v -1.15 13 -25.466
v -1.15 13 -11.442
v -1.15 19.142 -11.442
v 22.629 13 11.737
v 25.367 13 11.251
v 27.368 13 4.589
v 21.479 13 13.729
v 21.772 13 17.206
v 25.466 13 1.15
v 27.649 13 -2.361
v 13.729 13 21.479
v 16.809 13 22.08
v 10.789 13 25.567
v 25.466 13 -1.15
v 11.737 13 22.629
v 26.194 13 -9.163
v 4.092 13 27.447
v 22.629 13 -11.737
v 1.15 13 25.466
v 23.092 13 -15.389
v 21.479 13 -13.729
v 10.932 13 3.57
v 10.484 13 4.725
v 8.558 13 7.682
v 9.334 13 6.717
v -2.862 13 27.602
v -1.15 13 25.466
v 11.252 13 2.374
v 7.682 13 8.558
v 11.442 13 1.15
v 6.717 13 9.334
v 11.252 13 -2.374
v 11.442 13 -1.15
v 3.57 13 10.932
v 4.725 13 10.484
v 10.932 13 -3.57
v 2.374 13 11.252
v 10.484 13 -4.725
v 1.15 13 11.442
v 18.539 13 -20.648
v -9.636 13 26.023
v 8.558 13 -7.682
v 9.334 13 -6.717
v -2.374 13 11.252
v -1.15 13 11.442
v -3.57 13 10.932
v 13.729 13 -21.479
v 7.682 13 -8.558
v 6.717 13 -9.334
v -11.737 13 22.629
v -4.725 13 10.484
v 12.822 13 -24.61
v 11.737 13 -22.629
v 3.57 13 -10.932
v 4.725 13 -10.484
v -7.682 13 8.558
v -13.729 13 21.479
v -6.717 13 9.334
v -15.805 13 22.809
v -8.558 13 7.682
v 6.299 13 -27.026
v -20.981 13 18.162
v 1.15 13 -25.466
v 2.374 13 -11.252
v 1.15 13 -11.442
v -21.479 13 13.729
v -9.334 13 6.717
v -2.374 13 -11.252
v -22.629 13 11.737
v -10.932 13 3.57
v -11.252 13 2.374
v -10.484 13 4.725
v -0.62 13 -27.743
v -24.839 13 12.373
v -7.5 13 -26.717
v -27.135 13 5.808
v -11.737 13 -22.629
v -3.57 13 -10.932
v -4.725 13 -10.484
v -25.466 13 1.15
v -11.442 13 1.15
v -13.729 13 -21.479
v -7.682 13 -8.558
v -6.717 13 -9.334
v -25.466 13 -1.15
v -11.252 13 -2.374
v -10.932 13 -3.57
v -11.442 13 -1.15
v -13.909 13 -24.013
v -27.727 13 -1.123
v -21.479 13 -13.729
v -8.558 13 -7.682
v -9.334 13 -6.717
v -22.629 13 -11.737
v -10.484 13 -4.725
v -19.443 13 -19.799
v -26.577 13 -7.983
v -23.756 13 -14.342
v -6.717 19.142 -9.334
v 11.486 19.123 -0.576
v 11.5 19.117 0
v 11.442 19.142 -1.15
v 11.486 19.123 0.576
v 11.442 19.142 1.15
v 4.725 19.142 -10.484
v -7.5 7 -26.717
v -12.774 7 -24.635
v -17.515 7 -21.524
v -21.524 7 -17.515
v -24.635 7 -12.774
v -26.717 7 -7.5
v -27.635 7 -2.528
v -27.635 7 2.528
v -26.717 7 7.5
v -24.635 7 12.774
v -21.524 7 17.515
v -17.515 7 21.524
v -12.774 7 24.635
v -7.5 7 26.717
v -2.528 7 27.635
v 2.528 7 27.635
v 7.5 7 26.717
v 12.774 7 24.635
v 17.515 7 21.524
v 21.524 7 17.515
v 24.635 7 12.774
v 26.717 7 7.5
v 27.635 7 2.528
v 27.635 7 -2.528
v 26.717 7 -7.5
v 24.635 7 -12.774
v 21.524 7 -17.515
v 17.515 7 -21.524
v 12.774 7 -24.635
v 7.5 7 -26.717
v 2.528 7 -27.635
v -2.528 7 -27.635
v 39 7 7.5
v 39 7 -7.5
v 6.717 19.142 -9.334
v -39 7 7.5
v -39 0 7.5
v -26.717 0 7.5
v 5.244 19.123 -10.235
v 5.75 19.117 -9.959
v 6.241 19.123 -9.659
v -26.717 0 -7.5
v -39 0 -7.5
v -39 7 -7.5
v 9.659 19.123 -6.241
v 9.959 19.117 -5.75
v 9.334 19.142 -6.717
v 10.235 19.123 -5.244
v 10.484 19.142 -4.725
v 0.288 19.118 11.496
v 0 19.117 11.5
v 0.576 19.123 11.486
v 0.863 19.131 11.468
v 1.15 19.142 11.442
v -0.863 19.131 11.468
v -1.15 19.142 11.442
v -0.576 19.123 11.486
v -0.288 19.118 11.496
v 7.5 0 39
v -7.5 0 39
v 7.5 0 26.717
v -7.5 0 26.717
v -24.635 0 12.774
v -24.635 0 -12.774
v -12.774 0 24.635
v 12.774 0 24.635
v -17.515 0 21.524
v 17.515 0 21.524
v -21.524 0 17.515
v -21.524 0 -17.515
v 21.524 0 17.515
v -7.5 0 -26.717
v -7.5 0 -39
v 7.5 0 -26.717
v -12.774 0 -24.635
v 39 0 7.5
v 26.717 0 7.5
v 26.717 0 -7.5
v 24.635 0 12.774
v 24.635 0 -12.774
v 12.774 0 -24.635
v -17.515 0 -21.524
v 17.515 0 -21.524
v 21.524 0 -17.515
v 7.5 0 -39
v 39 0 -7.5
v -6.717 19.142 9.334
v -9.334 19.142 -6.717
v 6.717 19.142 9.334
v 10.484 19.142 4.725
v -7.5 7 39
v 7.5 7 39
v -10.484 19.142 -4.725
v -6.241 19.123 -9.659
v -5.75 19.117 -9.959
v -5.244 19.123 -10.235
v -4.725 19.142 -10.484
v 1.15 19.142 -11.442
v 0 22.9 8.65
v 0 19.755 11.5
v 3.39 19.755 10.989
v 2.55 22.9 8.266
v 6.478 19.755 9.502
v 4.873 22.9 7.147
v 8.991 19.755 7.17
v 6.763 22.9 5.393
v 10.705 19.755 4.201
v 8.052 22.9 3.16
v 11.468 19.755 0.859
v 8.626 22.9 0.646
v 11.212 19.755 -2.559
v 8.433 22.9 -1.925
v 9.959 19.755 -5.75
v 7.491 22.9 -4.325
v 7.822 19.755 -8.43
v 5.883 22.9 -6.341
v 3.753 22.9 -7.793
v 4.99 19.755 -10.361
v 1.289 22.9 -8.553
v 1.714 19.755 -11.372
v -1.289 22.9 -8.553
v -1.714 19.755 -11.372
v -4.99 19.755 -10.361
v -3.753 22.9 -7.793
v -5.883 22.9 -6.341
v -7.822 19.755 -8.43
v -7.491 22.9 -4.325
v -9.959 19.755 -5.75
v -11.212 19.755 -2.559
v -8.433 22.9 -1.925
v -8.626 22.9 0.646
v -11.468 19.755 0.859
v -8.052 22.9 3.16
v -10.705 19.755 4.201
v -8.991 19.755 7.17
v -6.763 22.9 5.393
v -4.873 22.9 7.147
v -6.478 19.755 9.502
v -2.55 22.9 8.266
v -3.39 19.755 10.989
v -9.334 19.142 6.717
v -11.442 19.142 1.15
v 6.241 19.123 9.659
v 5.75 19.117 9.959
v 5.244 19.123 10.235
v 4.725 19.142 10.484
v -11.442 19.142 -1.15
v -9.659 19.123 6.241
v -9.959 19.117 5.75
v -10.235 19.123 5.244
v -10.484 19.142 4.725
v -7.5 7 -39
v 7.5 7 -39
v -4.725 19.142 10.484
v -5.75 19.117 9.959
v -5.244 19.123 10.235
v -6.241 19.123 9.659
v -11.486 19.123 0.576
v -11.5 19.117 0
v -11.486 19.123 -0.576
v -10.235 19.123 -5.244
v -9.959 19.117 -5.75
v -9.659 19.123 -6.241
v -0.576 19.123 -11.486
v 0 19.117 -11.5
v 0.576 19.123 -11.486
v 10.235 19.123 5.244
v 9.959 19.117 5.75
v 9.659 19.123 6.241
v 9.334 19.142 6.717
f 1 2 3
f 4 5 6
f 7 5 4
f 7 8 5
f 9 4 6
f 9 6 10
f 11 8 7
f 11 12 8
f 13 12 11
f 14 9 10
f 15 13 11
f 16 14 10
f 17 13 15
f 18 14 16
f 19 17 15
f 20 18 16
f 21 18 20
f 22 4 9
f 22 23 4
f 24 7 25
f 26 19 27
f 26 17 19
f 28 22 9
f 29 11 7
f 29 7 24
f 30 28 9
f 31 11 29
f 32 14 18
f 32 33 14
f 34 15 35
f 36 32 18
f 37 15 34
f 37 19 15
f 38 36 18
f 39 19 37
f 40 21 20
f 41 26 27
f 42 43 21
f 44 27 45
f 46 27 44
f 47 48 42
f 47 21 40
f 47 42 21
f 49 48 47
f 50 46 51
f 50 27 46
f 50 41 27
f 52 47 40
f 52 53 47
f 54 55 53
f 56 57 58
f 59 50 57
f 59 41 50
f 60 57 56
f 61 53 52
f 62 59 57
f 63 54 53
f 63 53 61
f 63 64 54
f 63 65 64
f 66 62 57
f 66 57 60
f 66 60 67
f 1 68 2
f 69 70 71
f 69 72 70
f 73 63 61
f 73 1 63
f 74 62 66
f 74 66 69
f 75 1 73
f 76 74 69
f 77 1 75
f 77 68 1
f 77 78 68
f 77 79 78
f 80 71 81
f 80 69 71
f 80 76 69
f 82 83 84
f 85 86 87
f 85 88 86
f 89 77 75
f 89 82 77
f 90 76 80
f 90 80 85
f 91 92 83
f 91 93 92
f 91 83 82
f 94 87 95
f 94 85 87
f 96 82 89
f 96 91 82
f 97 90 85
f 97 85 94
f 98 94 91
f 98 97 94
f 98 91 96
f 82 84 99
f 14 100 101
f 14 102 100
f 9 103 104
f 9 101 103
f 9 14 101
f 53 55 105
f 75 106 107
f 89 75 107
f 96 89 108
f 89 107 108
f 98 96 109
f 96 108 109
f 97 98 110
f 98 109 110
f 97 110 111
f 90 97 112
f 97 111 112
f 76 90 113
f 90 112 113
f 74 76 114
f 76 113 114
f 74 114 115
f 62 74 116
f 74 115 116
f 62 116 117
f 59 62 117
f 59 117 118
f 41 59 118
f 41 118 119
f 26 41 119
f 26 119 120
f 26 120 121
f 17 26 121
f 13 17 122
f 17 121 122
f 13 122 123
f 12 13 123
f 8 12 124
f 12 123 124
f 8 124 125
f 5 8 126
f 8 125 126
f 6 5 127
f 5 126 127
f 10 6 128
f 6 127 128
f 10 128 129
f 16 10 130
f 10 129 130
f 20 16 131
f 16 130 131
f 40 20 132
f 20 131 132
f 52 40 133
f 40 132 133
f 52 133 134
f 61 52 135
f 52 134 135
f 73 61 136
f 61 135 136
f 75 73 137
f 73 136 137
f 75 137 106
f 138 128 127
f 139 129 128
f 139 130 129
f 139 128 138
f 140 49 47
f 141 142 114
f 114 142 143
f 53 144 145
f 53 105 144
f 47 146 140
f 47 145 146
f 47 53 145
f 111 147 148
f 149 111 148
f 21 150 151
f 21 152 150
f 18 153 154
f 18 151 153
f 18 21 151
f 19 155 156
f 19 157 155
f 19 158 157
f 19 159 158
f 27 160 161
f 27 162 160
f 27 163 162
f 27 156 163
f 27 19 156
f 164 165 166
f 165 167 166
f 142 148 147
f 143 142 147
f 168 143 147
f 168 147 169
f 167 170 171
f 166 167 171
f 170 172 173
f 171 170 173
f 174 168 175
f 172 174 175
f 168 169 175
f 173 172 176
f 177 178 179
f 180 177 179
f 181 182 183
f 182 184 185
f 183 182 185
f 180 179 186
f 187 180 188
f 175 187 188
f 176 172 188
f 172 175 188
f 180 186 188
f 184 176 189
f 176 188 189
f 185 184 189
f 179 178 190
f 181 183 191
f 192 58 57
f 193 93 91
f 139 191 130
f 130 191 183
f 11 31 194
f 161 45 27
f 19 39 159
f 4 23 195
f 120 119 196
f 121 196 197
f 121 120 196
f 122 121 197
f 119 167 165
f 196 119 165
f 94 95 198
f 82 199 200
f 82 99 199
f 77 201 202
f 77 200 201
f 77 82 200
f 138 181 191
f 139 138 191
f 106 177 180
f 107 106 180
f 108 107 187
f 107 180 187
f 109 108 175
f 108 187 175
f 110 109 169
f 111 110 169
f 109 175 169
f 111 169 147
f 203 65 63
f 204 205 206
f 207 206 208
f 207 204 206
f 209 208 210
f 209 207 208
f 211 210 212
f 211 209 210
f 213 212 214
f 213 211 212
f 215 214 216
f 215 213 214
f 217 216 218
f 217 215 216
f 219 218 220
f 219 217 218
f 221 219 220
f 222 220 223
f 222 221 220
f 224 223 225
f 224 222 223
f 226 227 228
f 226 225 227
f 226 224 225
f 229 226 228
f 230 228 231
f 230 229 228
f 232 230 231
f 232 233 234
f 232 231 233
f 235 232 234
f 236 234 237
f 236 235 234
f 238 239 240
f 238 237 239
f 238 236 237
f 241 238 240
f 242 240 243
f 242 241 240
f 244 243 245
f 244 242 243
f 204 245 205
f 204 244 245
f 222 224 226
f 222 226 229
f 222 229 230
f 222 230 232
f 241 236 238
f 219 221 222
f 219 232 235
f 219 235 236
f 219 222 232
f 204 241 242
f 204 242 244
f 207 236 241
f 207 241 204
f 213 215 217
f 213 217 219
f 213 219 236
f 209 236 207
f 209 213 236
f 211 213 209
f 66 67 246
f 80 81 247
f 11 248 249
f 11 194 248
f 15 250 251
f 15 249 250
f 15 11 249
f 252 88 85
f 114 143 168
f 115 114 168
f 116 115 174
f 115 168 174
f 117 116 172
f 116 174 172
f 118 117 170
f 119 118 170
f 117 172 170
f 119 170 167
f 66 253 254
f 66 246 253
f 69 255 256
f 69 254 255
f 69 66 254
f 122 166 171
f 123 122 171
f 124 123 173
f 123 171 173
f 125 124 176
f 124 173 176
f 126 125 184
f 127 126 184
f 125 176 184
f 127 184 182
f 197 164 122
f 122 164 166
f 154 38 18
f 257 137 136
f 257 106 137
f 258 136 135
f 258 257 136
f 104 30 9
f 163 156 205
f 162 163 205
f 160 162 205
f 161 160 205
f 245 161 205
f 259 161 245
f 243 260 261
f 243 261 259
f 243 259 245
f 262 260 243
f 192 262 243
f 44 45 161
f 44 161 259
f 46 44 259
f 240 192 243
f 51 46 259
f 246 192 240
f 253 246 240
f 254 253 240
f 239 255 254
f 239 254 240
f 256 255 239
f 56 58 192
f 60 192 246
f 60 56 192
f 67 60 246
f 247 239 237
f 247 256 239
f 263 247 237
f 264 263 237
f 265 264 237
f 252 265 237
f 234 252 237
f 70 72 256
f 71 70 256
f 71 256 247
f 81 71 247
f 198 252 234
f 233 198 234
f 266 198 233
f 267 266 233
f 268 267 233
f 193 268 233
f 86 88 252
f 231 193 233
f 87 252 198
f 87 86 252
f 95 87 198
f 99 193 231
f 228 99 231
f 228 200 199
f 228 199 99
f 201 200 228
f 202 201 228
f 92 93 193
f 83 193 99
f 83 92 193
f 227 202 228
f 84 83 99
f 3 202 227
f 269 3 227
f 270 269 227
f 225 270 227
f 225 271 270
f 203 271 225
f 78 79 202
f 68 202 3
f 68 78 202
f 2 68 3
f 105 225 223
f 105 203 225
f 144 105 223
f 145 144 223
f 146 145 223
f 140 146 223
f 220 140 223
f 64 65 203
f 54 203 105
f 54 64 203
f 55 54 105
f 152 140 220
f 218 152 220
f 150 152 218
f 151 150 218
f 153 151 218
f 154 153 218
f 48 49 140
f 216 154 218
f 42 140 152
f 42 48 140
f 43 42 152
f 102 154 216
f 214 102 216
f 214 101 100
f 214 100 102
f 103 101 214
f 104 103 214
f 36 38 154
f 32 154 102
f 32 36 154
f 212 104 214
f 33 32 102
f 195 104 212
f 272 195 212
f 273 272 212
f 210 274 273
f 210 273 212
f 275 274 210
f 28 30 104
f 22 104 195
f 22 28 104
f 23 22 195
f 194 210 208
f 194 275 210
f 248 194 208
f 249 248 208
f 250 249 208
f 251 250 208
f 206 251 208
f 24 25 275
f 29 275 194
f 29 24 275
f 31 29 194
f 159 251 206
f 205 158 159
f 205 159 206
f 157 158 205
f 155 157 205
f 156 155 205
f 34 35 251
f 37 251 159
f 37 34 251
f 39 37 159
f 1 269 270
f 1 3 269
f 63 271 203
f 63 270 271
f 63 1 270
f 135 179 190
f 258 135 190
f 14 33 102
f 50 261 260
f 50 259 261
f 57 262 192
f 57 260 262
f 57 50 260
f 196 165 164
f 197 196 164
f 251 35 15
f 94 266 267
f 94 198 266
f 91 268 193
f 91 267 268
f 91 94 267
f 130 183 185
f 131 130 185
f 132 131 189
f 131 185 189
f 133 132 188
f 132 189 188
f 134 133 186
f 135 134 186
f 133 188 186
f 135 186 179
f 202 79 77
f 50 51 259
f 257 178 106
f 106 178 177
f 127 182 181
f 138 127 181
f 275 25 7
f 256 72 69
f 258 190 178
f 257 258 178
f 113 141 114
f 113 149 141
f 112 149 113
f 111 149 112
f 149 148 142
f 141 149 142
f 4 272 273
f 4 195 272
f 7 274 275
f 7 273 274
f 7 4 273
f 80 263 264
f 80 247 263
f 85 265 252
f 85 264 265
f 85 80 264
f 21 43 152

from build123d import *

# Parameters (mm, degrees)
SALIENTE_EXTRUIR1_DEPTH = 7
CROQUIS2_R              = 27.75
SALIENTE_EXTRUIR2_DEPTH = 6
CROQUIS3_R              = 11.5
SALIENTE_EXTRUIR3_DEPTH = 6.7
NERVIO5_START           = -18.11144548
NERVIO5_OUTLINE_W       = 2.3
NERVIO5_OUTLINE_H       = 7.124259241
NERVIO5_DEPTH           = 15.309418884
MATRIZC1_COUNT          = 12
CROQUIS5_R              = 8.65
SALIENTE_EXTRUIR4_DEPTH = 3.2
CHAFL_N1_SIZE           = 2.9
CHAFL_N1_SIZE_2         = 3.2


# Read off the part's stored shape, not the designer's step: Nervio5
with BuildPart() as part:
    # Croquis1 → Saliente-Extruir1 (new body)
    with BuildSketch(Plane(origin=(0, 0, 0), x_dir=(1, 0, 0), z_dir=(0, 1, 0))):
        with BuildLine():
            Line((-7.5, -39), (7.5, -39))
            Line((7.5, -39), (7.5, -26.717269696))
            ThreePointArc((7.5, -26.717269696), (19.622213178, -19.622213178), (26.717269696, -7.5))
            Line((26.717269696, -7.5), (39, -7.5))
            Line((39, -7.5), (39, 7.5))
            Line((39, 7.5), (26.717269696, 7.5))
            ThreePointArc((26.717269696, 7.5), (19.622213178, 19.622213178), (7.5, 26.717269696))
            Line((7.5, 26.717269696), (7.5, 39))
            Line((7.5, 39), (-7.5, 39))
            Line((-7.5, 39), (-7.5, 26.717269696))
            ThreePointArc((-7.5, 26.717269696), (-19.622213178, 19.622213178), (-26.717269696, 7.5))
            Line((-26.717269696, 7.5), (-39, 7.5))
            Line((-39, 7.5), (-39, -7.5))
            Line((-39, -7.5), (-26.717269696, -7.5))
            ThreePointArc((-26.717269696, -7.5), (-19.622213178, -19.622213178), (-7.5, -26.717269696))
            Line((-7.5, -26.717269696), (-7.5, -39))
        make_face()
    extrude(amount=SALIENTE_EXTRUIR1_DEPTH)

    # Croquis2 → Saliente-Extruir2 (add)
    with BuildSketch(Plane(origin=(0, 7, 0), x_dir=(1, 0, 0), z_dir=(0, 1, 0))):
        with Locations(Location((0, 0, 0), (0, 0, 105.680350135))):
            Circle(CROQUIS2_R)
    extrude(amount=SALIENTE_EXTRUIR2_DEPTH)

    # Croquis3 → Saliente-Extruir3 (add)
    with BuildSketch(Plane(origin=(0, 13, 0), x_dir=(1, 0, 0), z_dir=(0, 1, 0))):
        with Locations(Location((0, 0, 0), (0, 0, 270))):
            Circle(CROQUIS3_R)
    extrude(amount=SALIENTE_EXTRUIR3_DEPTH)

    # Nervio5 outline → Nervio5 (add)
    with BuildSketch(Plane(origin=(0, 0, 0), x_dir=(1, 0, 0), z_dir=(0, 0.4011747826314881, 0.9160015249881293)).offset(NERVIO5_START)):
        with Locations((0, 18.562129621)):
            Rectangle(NERVIO5_OUTLINE_W, NERVIO5_OUTLINE_H)
    nervio5 = extrude(amount=NERVIO5_DEPTH)

    # MatrizC1: Nervio5 ×12 about axis
    matrizc1_axis = Axis((0, 0, 0), (0, 1, 0))
    for i in range(1, MATRIZC1_COUNT):
        add(nervio5.rotate(matrizc1_axis, i * 360 / MATRIZC1_COUNT))

    # Croquis5 → Saliente-Extruir4 (add)
    with BuildSketch(Plane(origin=(0, 19.7, 0), x_dir=(1, 0, 0), z_dir=(0, 1, 0))):
        with Locations(Location((0, 0, 0), (0, 0, 270))):
            Circle(CROQUIS5_R)
    extrude(amount=SALIENTE_EXTRUIR4_DEPTH)

    # Chaflán1
    # the kernel refuses this chamfer: 3.2, 2.9 mm, written as the material it adds along each edge
    with BuildSketch(Plane(origin=(0, 19.7, 0), x_dir=(0, 0, 1), z_dir=(-1, 0, 0))) as chafl_n1_piece_1_section:
        Polygon((8.65 + CHAFL_N1_SIZE, 0), (8.65, CHAFL_N1_SIZE_2), (8.65, 0), align=None)
    chafl_n1_piece_1 = revolve(axis=Axis((0, 19.7, 0), (0, 1, 0)), mode=Mode.PRIVATE)
    chafl_n1_piece_1 = chafl_n1_piece_1 & Plane(origin=(0, 21.282250987, 0), x_dir=(0, 0, 1), z_dir=(0, -1, 0)) * Cylinder(11.5, 47, mode=Mode.PRIVATE)
    chafl_n1_piece_1 = split(chafl_n1_piece_1, bisect_by=Plane(origin=(0, 22.9, -10.02497493), z_dir=(0, -1, 0)), keep=Keep.TOP, mode=Mode.PRIVATE)
    add(chafl_n1_piece_1)


solid = part.part
